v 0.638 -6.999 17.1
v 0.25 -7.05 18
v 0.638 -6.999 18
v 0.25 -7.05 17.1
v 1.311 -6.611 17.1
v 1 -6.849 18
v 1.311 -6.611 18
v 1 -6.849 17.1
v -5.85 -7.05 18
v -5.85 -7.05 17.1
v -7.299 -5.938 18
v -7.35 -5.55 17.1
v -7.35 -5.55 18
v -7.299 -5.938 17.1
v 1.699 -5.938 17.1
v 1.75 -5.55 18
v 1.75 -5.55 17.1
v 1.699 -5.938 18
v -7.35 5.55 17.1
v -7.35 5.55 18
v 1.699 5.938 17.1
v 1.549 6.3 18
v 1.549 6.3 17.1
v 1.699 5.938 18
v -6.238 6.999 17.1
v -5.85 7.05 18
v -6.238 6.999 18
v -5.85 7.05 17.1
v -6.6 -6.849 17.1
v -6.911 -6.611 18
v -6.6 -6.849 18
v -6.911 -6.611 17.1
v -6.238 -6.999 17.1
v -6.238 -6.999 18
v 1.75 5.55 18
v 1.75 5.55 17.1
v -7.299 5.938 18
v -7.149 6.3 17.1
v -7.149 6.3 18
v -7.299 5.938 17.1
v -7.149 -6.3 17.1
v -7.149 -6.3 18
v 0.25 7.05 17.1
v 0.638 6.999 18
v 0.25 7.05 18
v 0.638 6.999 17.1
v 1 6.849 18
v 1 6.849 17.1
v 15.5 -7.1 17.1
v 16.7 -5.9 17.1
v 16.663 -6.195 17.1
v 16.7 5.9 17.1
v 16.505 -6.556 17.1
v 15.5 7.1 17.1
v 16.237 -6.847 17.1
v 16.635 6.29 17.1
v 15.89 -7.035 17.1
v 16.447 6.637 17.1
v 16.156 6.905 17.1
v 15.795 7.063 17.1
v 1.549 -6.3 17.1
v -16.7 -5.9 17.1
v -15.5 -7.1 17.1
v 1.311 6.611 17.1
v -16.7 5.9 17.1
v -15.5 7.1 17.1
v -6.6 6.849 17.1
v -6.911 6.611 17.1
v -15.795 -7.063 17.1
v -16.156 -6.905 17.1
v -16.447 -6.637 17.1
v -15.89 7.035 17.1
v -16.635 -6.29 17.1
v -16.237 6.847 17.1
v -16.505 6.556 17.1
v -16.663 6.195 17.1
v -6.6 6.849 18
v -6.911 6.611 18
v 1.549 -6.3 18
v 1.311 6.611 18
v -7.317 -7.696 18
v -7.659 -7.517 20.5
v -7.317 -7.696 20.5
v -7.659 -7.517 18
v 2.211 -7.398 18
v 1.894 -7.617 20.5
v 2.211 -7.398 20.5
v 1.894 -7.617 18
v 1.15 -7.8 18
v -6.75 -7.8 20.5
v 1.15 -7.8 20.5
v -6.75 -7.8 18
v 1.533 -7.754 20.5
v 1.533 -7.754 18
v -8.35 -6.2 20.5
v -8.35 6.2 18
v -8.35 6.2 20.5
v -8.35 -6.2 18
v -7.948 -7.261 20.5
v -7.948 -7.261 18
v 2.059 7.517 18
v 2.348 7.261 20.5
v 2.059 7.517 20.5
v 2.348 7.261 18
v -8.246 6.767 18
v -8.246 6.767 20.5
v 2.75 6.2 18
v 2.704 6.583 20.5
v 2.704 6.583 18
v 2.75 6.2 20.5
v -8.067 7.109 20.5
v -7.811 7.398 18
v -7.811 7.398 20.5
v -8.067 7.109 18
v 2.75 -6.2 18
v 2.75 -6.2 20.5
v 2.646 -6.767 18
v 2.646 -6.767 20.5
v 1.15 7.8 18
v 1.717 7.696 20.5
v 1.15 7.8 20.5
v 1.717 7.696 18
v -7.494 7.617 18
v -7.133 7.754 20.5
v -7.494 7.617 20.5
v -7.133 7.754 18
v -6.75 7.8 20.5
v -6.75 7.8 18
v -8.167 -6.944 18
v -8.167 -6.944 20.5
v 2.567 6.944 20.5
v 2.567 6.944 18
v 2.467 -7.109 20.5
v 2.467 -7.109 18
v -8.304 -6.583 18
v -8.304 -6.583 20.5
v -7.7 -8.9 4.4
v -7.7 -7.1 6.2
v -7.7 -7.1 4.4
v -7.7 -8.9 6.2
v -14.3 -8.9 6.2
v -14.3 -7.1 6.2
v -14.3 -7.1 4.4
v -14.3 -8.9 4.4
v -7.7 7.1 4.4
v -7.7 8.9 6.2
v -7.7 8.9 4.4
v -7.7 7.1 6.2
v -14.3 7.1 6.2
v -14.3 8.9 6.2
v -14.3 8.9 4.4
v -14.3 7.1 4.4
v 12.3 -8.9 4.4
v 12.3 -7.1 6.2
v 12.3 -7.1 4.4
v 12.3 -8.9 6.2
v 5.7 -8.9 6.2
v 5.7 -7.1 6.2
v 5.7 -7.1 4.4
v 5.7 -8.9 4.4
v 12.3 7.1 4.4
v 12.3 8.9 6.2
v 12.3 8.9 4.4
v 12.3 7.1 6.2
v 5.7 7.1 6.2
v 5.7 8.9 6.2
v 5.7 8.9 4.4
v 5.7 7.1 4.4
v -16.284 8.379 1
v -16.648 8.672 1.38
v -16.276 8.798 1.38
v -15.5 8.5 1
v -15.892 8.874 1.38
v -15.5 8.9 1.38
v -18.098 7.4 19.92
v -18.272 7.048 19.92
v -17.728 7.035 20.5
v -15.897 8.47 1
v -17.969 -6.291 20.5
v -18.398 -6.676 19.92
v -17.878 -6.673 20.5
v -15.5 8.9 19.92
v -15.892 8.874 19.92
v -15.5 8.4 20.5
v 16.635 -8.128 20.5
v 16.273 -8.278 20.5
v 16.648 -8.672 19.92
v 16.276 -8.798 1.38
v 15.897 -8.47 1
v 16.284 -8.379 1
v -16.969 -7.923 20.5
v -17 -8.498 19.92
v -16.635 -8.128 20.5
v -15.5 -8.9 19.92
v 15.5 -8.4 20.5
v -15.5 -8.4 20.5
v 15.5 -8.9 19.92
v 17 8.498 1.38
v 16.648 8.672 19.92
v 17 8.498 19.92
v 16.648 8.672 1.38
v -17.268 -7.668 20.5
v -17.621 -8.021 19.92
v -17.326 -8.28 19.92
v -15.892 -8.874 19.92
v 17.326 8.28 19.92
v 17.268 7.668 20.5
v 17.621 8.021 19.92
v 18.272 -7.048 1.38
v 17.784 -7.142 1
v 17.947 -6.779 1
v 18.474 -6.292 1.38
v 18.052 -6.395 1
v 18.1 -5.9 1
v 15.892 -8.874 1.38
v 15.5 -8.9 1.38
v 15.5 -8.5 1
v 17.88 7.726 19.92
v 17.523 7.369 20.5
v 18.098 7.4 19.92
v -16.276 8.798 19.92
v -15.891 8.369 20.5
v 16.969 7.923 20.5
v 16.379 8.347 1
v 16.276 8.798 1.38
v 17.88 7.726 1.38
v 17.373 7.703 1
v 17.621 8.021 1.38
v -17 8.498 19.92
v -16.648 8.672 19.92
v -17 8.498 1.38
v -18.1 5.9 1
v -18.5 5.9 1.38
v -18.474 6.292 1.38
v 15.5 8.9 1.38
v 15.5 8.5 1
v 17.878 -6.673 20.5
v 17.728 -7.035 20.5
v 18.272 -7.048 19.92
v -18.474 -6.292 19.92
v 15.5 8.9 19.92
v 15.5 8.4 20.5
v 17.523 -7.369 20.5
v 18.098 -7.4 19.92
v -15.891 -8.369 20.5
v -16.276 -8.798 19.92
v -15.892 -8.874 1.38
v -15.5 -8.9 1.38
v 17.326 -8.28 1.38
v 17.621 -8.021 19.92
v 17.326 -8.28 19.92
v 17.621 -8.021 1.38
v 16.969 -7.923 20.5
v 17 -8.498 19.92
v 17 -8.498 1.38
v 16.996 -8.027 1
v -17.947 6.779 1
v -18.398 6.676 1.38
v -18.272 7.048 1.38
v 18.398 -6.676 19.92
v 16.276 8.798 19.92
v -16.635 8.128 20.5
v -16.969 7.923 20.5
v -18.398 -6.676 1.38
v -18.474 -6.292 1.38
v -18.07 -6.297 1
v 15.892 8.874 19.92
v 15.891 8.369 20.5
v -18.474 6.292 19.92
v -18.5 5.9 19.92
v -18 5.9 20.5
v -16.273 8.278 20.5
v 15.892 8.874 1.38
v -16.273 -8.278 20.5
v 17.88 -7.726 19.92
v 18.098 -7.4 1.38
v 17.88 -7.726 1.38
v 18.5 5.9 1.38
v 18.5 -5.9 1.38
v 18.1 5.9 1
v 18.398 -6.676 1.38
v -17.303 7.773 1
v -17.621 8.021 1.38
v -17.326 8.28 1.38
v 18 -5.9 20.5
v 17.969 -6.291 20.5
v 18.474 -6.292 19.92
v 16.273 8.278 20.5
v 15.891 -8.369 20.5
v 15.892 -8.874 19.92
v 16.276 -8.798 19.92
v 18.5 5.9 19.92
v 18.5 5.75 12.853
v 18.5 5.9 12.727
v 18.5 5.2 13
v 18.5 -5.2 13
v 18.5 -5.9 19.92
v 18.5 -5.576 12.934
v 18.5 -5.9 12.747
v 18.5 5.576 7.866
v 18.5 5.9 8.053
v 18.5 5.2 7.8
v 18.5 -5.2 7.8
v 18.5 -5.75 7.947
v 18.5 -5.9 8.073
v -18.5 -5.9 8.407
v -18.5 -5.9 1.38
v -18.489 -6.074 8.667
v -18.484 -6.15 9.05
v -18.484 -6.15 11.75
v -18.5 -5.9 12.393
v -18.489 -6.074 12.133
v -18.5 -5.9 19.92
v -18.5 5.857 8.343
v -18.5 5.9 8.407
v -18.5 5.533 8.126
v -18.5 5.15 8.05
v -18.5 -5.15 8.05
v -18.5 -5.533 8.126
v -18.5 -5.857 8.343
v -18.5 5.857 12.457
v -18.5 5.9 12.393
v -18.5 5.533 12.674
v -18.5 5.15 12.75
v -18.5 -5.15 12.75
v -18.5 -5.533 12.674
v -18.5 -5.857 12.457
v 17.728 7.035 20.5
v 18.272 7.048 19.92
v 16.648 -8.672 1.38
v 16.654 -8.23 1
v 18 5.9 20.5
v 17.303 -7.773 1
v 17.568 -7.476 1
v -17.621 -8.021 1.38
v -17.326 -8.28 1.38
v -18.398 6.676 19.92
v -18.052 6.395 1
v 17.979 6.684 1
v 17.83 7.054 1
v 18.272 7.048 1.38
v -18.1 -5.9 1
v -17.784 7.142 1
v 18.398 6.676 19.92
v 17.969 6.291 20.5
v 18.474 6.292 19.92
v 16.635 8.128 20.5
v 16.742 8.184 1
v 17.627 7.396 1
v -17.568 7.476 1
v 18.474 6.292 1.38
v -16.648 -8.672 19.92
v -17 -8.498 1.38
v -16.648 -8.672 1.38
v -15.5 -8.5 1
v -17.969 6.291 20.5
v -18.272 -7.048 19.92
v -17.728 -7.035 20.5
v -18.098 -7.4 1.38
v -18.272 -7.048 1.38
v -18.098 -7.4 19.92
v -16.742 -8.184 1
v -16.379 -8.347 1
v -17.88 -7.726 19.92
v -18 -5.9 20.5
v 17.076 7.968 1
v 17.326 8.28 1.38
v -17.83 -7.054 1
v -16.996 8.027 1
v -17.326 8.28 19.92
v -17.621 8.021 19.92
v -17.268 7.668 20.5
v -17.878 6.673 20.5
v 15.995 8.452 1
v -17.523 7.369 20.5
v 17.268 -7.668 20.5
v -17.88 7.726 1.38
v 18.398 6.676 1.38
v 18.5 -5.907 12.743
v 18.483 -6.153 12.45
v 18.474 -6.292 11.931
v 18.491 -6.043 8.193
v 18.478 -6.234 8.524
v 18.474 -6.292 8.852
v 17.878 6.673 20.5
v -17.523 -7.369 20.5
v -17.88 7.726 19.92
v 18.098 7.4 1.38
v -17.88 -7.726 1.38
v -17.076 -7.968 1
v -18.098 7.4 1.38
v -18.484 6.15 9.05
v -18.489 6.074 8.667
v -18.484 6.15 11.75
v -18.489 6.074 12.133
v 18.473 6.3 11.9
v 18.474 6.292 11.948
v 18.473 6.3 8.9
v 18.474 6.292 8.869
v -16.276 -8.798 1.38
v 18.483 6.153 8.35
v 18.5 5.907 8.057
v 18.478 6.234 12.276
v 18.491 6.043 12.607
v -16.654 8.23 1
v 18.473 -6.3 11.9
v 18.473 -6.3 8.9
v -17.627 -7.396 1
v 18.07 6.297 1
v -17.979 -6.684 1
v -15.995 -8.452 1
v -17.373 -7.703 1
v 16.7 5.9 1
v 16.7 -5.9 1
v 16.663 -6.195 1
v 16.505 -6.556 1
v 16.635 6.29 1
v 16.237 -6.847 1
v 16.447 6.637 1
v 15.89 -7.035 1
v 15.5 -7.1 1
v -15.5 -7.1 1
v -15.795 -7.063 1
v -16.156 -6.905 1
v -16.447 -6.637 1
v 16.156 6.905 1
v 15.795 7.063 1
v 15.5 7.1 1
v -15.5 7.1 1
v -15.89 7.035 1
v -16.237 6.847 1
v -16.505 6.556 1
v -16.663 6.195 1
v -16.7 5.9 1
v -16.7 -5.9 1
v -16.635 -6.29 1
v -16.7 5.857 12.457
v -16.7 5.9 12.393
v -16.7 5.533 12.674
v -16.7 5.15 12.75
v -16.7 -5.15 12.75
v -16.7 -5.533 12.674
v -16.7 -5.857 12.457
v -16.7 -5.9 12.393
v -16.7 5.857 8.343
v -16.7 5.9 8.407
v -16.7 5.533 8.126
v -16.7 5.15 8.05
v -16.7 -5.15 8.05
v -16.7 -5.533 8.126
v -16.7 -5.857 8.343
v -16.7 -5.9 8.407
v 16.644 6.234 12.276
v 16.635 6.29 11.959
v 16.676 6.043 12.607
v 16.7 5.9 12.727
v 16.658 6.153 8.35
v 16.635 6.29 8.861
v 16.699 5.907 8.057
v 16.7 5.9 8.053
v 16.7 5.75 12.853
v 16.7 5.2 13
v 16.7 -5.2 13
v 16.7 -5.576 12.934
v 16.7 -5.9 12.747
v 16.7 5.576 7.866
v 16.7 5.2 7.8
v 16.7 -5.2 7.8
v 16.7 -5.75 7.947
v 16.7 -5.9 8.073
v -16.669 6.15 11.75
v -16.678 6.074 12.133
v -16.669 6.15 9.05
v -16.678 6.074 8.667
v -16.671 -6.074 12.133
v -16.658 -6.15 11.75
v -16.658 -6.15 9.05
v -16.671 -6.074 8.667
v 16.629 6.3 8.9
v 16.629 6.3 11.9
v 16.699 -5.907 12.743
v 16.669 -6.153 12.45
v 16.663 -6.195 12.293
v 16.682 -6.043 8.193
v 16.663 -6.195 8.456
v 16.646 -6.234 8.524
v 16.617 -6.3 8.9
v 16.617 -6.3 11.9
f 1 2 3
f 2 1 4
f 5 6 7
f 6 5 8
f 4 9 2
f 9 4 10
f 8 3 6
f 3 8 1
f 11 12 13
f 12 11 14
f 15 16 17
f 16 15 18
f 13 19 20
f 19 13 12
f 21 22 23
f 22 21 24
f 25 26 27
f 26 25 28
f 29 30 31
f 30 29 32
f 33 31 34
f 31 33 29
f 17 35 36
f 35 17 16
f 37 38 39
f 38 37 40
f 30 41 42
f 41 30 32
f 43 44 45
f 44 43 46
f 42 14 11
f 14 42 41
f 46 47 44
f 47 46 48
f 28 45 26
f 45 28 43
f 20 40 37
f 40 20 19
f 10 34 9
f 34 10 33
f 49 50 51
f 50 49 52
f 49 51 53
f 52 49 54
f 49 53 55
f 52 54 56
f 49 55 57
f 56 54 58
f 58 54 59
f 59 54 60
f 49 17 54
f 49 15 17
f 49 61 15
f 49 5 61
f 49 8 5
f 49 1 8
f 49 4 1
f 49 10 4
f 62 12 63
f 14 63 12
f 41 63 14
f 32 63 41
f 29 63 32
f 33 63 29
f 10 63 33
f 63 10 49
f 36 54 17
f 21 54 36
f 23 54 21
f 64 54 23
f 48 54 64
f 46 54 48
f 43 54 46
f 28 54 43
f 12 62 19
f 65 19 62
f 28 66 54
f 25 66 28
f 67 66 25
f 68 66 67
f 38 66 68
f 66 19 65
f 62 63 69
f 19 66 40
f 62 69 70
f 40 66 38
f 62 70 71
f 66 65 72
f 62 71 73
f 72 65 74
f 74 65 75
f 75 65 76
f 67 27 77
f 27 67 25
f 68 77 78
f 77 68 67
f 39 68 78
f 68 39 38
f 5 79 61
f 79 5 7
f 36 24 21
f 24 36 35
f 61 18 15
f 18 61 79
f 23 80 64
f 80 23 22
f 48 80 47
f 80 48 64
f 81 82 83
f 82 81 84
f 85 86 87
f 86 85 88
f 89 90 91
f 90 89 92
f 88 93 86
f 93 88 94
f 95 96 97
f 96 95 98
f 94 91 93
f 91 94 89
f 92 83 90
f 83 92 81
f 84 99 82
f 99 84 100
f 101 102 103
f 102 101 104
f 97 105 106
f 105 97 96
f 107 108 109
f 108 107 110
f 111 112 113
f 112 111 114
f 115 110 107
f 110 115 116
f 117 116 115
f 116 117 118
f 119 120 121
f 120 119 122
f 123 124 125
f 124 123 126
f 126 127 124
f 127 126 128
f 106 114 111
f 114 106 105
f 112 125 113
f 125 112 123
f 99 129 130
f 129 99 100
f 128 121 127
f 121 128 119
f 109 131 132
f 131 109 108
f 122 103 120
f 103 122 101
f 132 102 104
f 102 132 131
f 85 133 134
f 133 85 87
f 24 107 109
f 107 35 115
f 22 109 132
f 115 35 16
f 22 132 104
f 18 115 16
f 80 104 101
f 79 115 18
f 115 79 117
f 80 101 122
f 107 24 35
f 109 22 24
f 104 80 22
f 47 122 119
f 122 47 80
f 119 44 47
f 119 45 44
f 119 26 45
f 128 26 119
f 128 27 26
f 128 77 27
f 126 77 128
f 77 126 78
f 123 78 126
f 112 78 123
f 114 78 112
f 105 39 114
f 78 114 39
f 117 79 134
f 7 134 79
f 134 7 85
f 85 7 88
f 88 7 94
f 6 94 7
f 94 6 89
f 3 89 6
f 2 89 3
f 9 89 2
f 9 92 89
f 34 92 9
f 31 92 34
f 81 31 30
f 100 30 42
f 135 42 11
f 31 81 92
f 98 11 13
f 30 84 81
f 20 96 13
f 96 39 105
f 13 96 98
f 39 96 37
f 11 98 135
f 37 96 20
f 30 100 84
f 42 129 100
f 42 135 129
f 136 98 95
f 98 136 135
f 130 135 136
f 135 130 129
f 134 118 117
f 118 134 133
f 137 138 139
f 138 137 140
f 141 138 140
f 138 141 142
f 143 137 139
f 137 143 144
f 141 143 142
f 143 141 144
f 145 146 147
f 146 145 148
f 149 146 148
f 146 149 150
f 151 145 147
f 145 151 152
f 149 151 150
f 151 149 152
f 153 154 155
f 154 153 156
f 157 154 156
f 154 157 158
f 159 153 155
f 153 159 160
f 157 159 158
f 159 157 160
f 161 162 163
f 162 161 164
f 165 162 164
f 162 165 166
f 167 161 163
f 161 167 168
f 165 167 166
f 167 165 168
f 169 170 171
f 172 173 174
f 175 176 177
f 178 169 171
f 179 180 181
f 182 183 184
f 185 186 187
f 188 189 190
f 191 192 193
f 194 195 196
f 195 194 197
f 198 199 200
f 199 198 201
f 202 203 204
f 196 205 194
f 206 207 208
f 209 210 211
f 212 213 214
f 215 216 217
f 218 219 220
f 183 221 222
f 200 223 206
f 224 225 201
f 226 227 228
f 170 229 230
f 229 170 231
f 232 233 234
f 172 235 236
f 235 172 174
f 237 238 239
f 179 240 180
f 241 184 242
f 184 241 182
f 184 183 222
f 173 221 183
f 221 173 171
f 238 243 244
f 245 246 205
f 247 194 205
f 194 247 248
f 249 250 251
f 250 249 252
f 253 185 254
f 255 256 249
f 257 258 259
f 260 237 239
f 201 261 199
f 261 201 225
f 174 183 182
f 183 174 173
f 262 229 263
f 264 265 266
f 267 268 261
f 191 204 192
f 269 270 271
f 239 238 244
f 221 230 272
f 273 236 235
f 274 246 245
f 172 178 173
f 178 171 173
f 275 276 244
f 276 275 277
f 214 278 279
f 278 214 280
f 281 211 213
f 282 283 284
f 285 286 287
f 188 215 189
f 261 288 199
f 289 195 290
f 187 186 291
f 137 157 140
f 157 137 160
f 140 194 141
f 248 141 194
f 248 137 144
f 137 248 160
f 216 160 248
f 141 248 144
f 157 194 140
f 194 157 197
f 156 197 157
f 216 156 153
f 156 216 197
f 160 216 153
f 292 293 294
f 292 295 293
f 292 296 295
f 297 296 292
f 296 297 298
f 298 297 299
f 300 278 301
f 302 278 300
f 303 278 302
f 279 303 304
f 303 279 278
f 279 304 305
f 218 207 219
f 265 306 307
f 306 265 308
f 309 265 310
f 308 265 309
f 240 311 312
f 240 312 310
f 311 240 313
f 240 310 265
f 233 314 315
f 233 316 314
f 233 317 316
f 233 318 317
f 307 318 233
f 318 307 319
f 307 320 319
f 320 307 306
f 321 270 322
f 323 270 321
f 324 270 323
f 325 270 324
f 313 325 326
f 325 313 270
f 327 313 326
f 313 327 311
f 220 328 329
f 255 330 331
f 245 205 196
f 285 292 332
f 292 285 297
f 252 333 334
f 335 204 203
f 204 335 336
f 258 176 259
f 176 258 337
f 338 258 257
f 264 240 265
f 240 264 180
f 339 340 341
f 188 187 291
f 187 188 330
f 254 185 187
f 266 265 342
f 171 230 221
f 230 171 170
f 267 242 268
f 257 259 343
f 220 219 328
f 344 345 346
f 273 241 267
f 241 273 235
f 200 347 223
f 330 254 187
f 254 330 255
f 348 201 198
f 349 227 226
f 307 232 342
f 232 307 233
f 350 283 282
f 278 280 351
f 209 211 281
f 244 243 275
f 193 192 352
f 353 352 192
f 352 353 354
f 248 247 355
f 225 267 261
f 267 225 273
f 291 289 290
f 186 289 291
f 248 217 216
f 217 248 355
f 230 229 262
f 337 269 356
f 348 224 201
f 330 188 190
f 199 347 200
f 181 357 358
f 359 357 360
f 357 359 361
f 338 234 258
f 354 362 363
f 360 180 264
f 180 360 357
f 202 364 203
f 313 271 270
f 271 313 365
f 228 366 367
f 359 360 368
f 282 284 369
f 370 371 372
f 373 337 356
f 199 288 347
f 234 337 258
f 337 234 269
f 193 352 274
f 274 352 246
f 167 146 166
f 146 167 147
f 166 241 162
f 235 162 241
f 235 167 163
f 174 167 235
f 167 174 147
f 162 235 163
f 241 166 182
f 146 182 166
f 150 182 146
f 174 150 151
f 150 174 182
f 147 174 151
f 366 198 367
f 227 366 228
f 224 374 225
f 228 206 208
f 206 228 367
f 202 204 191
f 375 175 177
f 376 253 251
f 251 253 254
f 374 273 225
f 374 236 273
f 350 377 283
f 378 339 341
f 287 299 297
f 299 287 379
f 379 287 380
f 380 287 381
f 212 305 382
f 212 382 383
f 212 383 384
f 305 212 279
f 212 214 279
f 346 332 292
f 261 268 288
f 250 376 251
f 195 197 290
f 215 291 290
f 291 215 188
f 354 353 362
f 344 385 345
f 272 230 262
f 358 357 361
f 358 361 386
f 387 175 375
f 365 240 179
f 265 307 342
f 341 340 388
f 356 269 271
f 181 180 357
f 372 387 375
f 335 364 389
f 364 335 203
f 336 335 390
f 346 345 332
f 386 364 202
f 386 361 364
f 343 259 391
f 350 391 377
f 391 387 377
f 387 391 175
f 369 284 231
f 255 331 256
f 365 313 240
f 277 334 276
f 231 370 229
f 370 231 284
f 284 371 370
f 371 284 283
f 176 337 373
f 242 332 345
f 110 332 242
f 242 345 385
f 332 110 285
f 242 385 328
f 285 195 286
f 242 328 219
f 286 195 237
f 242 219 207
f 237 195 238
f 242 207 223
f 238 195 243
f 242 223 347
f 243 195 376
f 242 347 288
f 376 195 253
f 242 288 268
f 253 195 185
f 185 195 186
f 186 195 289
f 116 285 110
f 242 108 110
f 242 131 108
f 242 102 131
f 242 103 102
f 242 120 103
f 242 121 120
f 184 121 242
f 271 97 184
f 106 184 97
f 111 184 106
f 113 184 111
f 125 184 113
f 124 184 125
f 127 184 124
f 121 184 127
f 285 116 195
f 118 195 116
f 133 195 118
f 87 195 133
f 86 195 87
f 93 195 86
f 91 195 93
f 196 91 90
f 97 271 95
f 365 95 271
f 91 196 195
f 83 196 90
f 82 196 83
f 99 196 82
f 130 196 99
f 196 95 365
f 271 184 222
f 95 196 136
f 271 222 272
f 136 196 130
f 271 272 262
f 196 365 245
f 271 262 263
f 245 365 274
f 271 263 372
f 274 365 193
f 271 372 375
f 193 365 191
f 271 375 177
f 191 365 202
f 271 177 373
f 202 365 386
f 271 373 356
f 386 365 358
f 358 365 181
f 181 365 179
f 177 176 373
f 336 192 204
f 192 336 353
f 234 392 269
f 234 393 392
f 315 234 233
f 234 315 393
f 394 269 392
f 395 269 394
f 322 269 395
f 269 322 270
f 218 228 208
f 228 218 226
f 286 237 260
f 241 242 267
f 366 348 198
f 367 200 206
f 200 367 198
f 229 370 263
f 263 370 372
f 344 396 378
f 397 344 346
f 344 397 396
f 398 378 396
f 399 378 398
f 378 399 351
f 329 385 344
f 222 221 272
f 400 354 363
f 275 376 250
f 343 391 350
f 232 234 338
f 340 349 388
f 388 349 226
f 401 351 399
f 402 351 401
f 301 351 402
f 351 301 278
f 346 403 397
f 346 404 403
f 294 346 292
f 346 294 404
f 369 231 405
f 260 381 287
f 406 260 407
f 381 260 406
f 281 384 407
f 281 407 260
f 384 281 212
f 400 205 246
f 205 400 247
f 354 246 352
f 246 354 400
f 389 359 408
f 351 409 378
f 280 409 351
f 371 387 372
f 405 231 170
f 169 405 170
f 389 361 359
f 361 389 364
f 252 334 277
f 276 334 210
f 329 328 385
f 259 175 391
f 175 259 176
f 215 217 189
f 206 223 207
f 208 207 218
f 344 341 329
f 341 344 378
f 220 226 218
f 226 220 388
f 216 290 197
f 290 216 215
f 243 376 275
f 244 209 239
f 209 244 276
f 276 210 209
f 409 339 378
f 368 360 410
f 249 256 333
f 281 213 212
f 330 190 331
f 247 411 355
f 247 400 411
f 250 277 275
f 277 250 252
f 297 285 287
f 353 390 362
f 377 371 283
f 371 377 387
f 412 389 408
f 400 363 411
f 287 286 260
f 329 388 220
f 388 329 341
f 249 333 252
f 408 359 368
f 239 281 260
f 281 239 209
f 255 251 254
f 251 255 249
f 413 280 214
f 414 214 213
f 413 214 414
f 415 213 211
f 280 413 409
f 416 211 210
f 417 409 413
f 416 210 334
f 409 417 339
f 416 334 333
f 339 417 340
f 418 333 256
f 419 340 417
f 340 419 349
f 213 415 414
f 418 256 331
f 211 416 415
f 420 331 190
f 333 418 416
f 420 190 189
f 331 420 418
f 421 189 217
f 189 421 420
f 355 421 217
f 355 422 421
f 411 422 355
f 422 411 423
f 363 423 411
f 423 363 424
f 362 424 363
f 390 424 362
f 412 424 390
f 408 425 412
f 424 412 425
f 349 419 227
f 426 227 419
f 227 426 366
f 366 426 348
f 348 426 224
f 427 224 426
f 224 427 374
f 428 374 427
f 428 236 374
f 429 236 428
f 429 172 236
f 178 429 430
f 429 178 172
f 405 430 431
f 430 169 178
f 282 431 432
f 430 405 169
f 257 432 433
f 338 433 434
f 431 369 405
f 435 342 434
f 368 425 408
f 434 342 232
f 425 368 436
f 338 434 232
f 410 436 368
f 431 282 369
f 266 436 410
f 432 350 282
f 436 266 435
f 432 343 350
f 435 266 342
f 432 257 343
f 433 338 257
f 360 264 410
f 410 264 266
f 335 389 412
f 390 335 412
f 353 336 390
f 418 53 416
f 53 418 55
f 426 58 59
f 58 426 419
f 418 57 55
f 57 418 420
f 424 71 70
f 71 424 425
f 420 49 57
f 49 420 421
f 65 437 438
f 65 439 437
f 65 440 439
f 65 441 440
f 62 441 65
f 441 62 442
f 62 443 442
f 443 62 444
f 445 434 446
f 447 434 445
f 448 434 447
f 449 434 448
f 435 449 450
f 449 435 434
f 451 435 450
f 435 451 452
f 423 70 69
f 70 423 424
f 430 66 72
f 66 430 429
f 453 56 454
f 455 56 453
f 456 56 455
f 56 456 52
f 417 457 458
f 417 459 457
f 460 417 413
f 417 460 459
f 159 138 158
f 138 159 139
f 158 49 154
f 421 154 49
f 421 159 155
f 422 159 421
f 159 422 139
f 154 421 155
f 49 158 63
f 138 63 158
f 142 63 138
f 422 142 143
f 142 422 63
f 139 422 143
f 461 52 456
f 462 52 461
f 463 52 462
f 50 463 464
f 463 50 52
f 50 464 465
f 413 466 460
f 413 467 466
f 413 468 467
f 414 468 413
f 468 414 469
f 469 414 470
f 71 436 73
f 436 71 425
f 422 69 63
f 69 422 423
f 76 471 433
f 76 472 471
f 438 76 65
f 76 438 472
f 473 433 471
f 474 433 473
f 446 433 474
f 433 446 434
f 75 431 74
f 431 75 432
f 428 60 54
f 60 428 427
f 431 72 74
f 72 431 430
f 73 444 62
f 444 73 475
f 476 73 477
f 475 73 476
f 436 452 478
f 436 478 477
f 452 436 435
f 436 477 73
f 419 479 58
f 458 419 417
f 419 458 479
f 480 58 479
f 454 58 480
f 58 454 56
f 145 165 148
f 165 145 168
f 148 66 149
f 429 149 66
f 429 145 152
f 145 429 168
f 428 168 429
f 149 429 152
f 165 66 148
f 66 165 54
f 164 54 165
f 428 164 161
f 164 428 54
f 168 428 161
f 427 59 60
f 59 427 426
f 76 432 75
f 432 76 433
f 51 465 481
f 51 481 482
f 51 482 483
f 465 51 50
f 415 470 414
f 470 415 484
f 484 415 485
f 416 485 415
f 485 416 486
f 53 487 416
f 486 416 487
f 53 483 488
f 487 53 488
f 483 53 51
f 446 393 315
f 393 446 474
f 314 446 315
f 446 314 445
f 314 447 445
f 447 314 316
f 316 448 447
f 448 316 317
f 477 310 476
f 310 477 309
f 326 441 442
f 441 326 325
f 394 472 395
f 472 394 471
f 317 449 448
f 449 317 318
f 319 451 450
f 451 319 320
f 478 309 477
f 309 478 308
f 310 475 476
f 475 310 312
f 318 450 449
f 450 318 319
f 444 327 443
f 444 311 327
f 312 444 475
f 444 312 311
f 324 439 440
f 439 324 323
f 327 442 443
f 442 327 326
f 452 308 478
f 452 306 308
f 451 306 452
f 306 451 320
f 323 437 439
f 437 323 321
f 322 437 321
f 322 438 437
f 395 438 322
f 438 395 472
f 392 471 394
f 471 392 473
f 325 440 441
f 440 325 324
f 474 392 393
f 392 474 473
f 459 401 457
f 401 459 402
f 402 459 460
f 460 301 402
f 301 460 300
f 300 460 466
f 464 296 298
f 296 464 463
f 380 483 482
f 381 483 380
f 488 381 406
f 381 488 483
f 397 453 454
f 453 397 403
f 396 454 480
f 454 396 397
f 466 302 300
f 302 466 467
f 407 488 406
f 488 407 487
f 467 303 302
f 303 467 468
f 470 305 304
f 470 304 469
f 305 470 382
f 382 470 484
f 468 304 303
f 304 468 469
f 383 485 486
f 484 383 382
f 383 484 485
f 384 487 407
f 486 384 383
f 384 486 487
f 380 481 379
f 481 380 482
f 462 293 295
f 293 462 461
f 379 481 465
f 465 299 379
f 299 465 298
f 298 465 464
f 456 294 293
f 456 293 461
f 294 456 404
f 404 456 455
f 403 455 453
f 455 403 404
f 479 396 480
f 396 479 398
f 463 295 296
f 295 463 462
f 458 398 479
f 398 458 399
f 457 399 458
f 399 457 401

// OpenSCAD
/* ============================================================
   USB-A 直通 DC 开关外壳  (USB-A 公 → USB-A 母, 无 PCB 直接焊线)
   紧凑版: 船型开关横置 (长边沿 Y), 外形 37.0 × 17.8 × 20.5 mm
   --------------------------------------------------------------
   打印件:   body  外壳主体 (装开关 / 两个 USB 口 / 卡扣窗口)
             lid   底盖    (卡扣 + 内部焊线舱)
   预览件:   连接器 / 开关 示意 (不打印, 仅装配预览用)

   设计要点 (PETG):
     - 卡扣：5.3 mm 竖立悬臂 + 50° 凸棱, 0.2 mm 咬合, 免支撑
     - 滑动/压配留 0.1~0.3 mm 正常余量 (材料收缩已校准)
     - 内部无锐利内角, 外壳壁 1.8 mm, 顶壁 3.4 mm
     - body 开口朝下打印, 内部顶面需切片软件支撑; lid 平放无支撑
   ============================================================ */

$fa = 2;
$fs = 0.4;

part = "body";        // body | lid | assembly | section

// ---------------- 外壳总体 ----------------
L        = 37.0;     // X 长度
W        = 17.8;     // Y 宽度
H        = 20.5;     // Z 高度
r_plan   = 3.0;      // 俯视圆角
wall     = 1.8;      // 侧壁厚度
tw       = 3.4;      // 顶壁厚度
lid_t    = 2.4;      // 底盖总厚度
front_wall = 1.8;    // 前端(公头)壁厚
back_wall  = 1.8;    // 后端(母口)壁厚
top_ch   = 0.6;      // 顶边倒角高度
top_inset= 0.5;      // 顶边倒角内缩
bot_inset= 0.4;      // 底边倒角内缩

z_floor = lid_t;          // 内部底面 2.4
z_ceil  = H - tw;         // 内部顶面 17.1

// ---------------- 元器件尺寸 (按采购图纸) ----------------
// USB-A 90° 直插焊板公头
m_shell_l = 12.05;  m_shell_w = 12.05;  m_shell_h = 4.5;
m_body_l  = 6.75;   m_body_w  = 12.8;   m_body_h  = 4.55;
m_pin_drop= 5.1;    m_pin_pitch= 2.0;   m_pin_w   = 0.8;  m_elbow = 1.9;

// USB-A 90° 直插焊板母座
f_shell_l= 14.1;    f_shell_w = 13.2;   f_shell_h = 6.8;
f_pin_drop= 3.8;    f_post_drop= 3.25;

// 白色船型开关 (KCD11 类) —— 长边沿 Y 横置
sw_bz_x  = 10.5;    sw_bz_y  = 15.0;    sw_bz_t  = 2.5;
sw_body_x= 8.5;     sw_body_y= 13.0;    sw_body_t= 11.0;
sw_pin_len = 5.0;
sw_tab_w = 3.6;     sw_tab_t = 0.5;     // 2 只引脚, 沿 Y 相距 5.0
sw_hole_x= 9.1;     sw_hole_y= 14.1;
sw_rec_x = 11.1;    sw_rec_y = 15.6;

z_usb = 10.4;             // USB 口轴线高度

// ---------------- 布局 ----------------
front_face  = -L/2;
back_face   =  L/2;
front_inner = front_face + front_wall;
back_inner  = back_face  - back_wall;
cav_d = L - front_wall - back_wall;     // 33.4
cav_w = W - 2*wall;                     // 14.2

m_shoulder = front_inner;                   // 公头塑料本体顶住前壁内表面
f_shoulder = back_inner;                    // 母座法兰顶住后壁内表面

m_shell_tip = m_shoulder - m_shell_l;       // 公头伸出端
m_body_rear = m_shoulder + m_body_l;        // -9.35
m_pin_rear = m_body_rear + m_elbow;         // -7.45

sw_body_front = m_pin_rear + 1.0;           // -6.45
sw_body_rear = sw_body_front + sw_body_x;   //  2.05
sw_cx = (sw_body_front + sw_body_rear)/2;   // -2.2

f_rear = f_shoulder - f_shell_l;            //  3.0

sw_seat = H - sw_bz_t;                      // 18.0 开关面板台阶面
ledge_t = sw_seat - z_ceil;                 //  0.9 沉槽台阶厚度

// ============================================================
//  基础工具
// ============================================================
module rrect2d(w, h, r) {
  offset(r=r) square([w-2*r, h-2*r], center=true);
}

module rr_prism_z(w, h, r, z0, z1) {
  translate([0,0,z0]) linear_extrude(z1-z0) rrect2d(w,h,r);
}

// 沿 X 方向的棱柱: 截面在 YZ 平面, w=Y 宽, h=Z 高
module rr_prism_x(x0, x1, y, z, w, h, r) {
  translate([x0,y,z])
  multmatrix([[0,0,1,0],
             [1,0,0,0],
             [0,1,0,0],
             [0,0,0,1]])
  linear_extrude(x1-x0) rrect2d(w,h,r);
}

// 沿 X 方向的棱柱: 截面为任意 2D 多边形 (u=Y, v=Z)
module prism_x(x0, len, poly) {
  translate([x0,0,0])
  multmatrix([[0,0,1,0],
             [1,0,0,0],
             [0,1,0,0],
             [0,0,0,1]])
  linear_extrude(len) polygon(poly);
}

// ============================================================
//  外壳主体 body
// ============================================================
module outer_solid() {
  hull() {
    // 底边 45° 倒角
    translate([0,0,1.00])       linear_extrude(0.02) rrect2d(L-2*bot_inset, W-2*bot_inset, r_plan-bot_inset);
    translate([0,0,1.38])       linear_extrude(0.02) rrect2d(L, W, r_plan);
    // 顶边 45° 倒角
    translate([0,0,H-top_ch])   linear_extrude(0.02) rrect2d(L, W, r_plan);
    translate([0,0,H-0.02])     linear_extrude(0.02) rrect2d(L-2*top_inset, W-2*top_inset, r_plan-top_inset);
  }
}

module cavity() {
  // 从底面以下 0.1 起切, 避免与底面共面
  translate([0,0,z_floor-1.5]) linear_extrude(z_ceil-(z_floor-1.5)) rrect2d(cav_d, cav_w, r_plan-wall);
}

// 公头: 通孔 (本体直接顶住前壁内表面, 靠孔定位)
module male_cuts() {
  rr_prism_x(front_face-0.1, m_shoulder+0.1, 0, z_usb, 12.3, 4.7, 1.0);
}

// 母座: 通孔
module female_cuts() {
  rr_prism_x(f_shoulder-0.1, back_face+0.1, 0, z_usb, 12.6, 5.2, 1.1);
}

// 开关: 穿线孔 + 沉槽 (横置)
module switch_cuts() {
  translate([sw_cx,0,z_ceil])  linear_extrude(ledge_t+0.1)      rrect2d(sw_hole_x, sw_hole_y, 1.5);
  translate([sw_cx,0,sw_seat]) linear_extrude(H-sw_seat+0.1)   rrect2d(sw_rec_x,  sw_rec_y,  1.6);
}

// 卡扣窗口 (两侧各 2 处)
module window_cuts() {
  for (x = [-11, 9], s = [-1,1])
    translate([x, s*(cav_w+W)/4, 5.3]) cube([6.6, 2.0, 1.8], center=true);
}

module body() {
  difference() {
    outer_solid();
    cavity();
    male_cuts();
    female_cuts();
    switch_cuts();
    window_cuts();
  }
}

// ============================================================
//  底盖 lid
// ============================================================
lid_yo = (cav_w - 0.3)/2 - 0.05;   // 6.90 卡扣外侧基准 (内缩 0.05 避免共面)
lid_fl_l = L - 0.2;            // 36.8
lid_fl_w = W - 0.2;            // 17.6
lid_in_l = cav_d - 0.3;        // 33.1
lid_in_w = cav_w - 0.3;        // 13.9

module lid_base() {
  union() {
    // 外翻边 (底盘) 0 .. 1.0, 底部 45° 倒角
    hull() {
      translate([0,0,0.0])  linear_extrude(0.02) rrect2d(lid_fl_l-1.0, lid_fl_w-1.0, r_plan-0.6);
      translate([0,0,0.48]) linear_extrude(0.02) rrect2d(lid_fl_l,     lid_fl_w,     r_plan-0.1);
    }
    translate([0,0,0.5]) linear_extrude(0.5) rrect2d(lid_fl_l, lid_fl_w, r_plan-0.1);
    // 内侧部分 1.0 .. 2.4 (与翻边顶面拼接)
    translate([0,0,1.0]) linear_extrude(lid_t-1.0) rrect2d(lid_in_l, lid_in_w, r_plan-wall-0.3);
  }
}

// 单个竖立卡扣悬臂 (5.3 mm 长, 根部埋入翻边 0.1, 免支撑)
module hook_one(x, s) {
  translate([x, s*6.40, 3.55]) cube([6, 1.0, 5.3], center=true);   // z 0.9..6.2
  // 50° 凸棱: 下斜面 = 卡扣面 (过窗口下沿 7.1/4.4), 上斜面 = 导入面
  prism_x(x-2.9, 5.8, [
    [s*6.90, 4.160], [s*7.30, 4.637], [s*6.90, 5.114]
  ]);
}

// 悬臂周围的让位槽 (只切内台阶, 不切翻边; 让 5.2 mm 悬臂能自由回弹)
module hook_pockets() {
  for (x = [-11, 9], s = [-1,1])
    translate([x, s*6.14, 1.715]) cube([7.2, 1.68, 1.47], center=true);  // z 0.98..2.45
}

module hooks() {
  for (x = [-11, 9])
    for (s = [-1,1])
      hook_one(x, s);
}

// 开关引脚下方浅舱 (横置时引脚沿 Y 分布, 留足两种可能)
module switch_pin_pocket() {
  translate([sw_cx, 0, 1.4]) linear_extrude(1.1) rrect2d(11.0, 9.0, 1.0);
}

module lid() {
  union() {
    difference() {
      lid_base();
      hook_pockets();
      switch_pin_pocket();
    }
    hooks();
  }
}

// ============================================================
//  装配预览件 (不打印)
// ============================================================
module male_conn() {
  rr_prism_x(m_shell_tip, m_shoulder, 0, z_usb, m_shell_w, m_shell_h, 1.0);
  rr_prism_x(m_shoulder,  m_body_rear, 0, z_usb, m_body_w, m_body_h, 1.5);
  for (i = [0:3])
    translate([m_body_rear + m_elbow/2, (i-1.5)*m_pin_pitch, z_usb - m_body_h/2 - m_pin_drop/2])
      cube([m_elbow, m_pin_w, m_pin_drop], center=true);
}

module female_conn() {
  rr_prism_x(f_rear, f_shoulder, 0, z_usb, f_shell_w, f_shell_h, 1.5);
  for (i = [0:3])
    translate([f_rear + 1.4, (i-1.5)*m_pin_pitch, z_usb - f_shell_h/2 - f_pin_drop/2])
      cube([2.4, m_pin_w, f_pin_drop], center=true);
  for (y = [-3.5, 3.5])
    translate([f_rear + 1.4, y, z_usb - f_shell_h/2 - f_post_drop/2])
      sphere(r=1.25, $fn=24);
}

module switch_conn() {
  translate([sw_cx, 0, 0]) rr_prism_z(sw_body_x, sw_body_y, 1.5, sw_seat-sw_body_t, sw_seat);
  translate([sw_cx, 0, 0]) rr_prism_z(sw_bz_x,   sw_bz_y,   2.0, sw_seat, H);
  for (y = [-2.5, 2.5])
    translate([sw_cx - sw_tab_t/2, y - sw_tab_w/2, sw_seat-sw_body_t-sw_pin_len])
      cube([sw_tab_t, sw_tab_w, sw_pin_len]);
}

module assembly() {
  color([0.78,0.80,0.85,1]) body();
  color([0.70,0.72,0.78,1]) lid();
  color([0.90,0.25,0.25,0.40]) male_conn();
  color([0.25,0.60,0.90,0.40]) female_conn();
  color([0.25,0.85,0.55,0.40]) switch_conn();
}

// ============================================================
//  尺寸自检
// ============================================================
module checks() {
  echo(str("[check] case outer      = ", L, " x ", W, " x ", H));
  echo(str("[check] cavity          = ", cav_d, " x ", cav_w));
  echo(str("[check] male shell tip  = ", m_shell_tip, " (case face ", front_face, ")"));
  echo(str("[check] male pin tip z  = ", z_usb - m_body_h/2 - m_pin_drop, " (floor ", z_floor, ")"));
  echo(str("[check] female pin tip z= ", z_usb - f_shell_h/2 - f_pin_drop, " (floor ", z_floor, ")"));
  echo(str("[check] switch pin tip z= ", sw_seat - sw_body_t - sw_pin_len, " (floor ", z_floor, ", pocket 1.0)"));
  echo(str("[check] switch seat     = ", sw_seat, " ledge ", ledge_t));

  assert(m_shell_tip < front_face, "公头未能伸出外壳");
  assert(z_usb - m_body_h/2 - m_pin_drop > z_floor + 0.4, "公头引脚顶到底盖");
  assert(z_usb - f_shell_h/2 - f_pin_drop > z_floor + 0.4, "母座引脚顶到底盖");
  assert(sw_seat - sw_body_t - sw_pin_len > z_floor - 1.0, "开关引脚超出底盖可容纳范围");
  assert(ledge_t >= 0.6, "开关沉槽台阶太薄");
  assert(cav_w > sw_body_y + 0.3, "开关本体放不进内腔");
  assert(sw_body_rear + 0.8 <= f_rear, "开关与母座干涉");
  assert(sw_body_front > m_pin_rear + 0.6, "开关与公头引脚干涉");
  assert(f_shoulder < back_face, "母座定位槽超出后壁");
  assert(12.3 > m_shell_w + 0.15, "公头通孔过小");
  assert(12.3 < m_body_w, "公头通孔大于本体, 无法限位");
  assert(12.6 < f_shell_w, "母座通孔大于外壳, 无法限位");
  assert(12.6 > 12.05 + 0.4, "母座通孔比插头还小");
  assert(sw_hole_x > sw_body_x + 0.3, "开关过孔 X 向余量不足");
  assert(sw_hole_y > sw_body_y + 0.3, "开关过孔 Y 向余量不足");
  assert(sw_hole_y < sw_bz_y, "开关过孔大于面板, 开关会掉进去");
  assert(sw_rec_y < W - 2*top_inset - 0.8, "开关沉槽离外壳顶边太近");
  assert(sw_cx - sw_rec_x/2 > front_face + 1.0, "开关沉槽超出前端");
  assert(sw_cx + sw_rec_x/2 < back_face - 1.0, "开关沉槽超出后端");
}

// ============================================================
if (part == "body")      body();
if (part == "lid")       lid();
if (part == "assembly")  assembly();
if (part == "section")
  difference() {
    assembly();
    translate([-100, 0, -100]) cube([200, 100, 200]);   // 去掉 y>0, 从 +Y 看剖面
  }

checks();
